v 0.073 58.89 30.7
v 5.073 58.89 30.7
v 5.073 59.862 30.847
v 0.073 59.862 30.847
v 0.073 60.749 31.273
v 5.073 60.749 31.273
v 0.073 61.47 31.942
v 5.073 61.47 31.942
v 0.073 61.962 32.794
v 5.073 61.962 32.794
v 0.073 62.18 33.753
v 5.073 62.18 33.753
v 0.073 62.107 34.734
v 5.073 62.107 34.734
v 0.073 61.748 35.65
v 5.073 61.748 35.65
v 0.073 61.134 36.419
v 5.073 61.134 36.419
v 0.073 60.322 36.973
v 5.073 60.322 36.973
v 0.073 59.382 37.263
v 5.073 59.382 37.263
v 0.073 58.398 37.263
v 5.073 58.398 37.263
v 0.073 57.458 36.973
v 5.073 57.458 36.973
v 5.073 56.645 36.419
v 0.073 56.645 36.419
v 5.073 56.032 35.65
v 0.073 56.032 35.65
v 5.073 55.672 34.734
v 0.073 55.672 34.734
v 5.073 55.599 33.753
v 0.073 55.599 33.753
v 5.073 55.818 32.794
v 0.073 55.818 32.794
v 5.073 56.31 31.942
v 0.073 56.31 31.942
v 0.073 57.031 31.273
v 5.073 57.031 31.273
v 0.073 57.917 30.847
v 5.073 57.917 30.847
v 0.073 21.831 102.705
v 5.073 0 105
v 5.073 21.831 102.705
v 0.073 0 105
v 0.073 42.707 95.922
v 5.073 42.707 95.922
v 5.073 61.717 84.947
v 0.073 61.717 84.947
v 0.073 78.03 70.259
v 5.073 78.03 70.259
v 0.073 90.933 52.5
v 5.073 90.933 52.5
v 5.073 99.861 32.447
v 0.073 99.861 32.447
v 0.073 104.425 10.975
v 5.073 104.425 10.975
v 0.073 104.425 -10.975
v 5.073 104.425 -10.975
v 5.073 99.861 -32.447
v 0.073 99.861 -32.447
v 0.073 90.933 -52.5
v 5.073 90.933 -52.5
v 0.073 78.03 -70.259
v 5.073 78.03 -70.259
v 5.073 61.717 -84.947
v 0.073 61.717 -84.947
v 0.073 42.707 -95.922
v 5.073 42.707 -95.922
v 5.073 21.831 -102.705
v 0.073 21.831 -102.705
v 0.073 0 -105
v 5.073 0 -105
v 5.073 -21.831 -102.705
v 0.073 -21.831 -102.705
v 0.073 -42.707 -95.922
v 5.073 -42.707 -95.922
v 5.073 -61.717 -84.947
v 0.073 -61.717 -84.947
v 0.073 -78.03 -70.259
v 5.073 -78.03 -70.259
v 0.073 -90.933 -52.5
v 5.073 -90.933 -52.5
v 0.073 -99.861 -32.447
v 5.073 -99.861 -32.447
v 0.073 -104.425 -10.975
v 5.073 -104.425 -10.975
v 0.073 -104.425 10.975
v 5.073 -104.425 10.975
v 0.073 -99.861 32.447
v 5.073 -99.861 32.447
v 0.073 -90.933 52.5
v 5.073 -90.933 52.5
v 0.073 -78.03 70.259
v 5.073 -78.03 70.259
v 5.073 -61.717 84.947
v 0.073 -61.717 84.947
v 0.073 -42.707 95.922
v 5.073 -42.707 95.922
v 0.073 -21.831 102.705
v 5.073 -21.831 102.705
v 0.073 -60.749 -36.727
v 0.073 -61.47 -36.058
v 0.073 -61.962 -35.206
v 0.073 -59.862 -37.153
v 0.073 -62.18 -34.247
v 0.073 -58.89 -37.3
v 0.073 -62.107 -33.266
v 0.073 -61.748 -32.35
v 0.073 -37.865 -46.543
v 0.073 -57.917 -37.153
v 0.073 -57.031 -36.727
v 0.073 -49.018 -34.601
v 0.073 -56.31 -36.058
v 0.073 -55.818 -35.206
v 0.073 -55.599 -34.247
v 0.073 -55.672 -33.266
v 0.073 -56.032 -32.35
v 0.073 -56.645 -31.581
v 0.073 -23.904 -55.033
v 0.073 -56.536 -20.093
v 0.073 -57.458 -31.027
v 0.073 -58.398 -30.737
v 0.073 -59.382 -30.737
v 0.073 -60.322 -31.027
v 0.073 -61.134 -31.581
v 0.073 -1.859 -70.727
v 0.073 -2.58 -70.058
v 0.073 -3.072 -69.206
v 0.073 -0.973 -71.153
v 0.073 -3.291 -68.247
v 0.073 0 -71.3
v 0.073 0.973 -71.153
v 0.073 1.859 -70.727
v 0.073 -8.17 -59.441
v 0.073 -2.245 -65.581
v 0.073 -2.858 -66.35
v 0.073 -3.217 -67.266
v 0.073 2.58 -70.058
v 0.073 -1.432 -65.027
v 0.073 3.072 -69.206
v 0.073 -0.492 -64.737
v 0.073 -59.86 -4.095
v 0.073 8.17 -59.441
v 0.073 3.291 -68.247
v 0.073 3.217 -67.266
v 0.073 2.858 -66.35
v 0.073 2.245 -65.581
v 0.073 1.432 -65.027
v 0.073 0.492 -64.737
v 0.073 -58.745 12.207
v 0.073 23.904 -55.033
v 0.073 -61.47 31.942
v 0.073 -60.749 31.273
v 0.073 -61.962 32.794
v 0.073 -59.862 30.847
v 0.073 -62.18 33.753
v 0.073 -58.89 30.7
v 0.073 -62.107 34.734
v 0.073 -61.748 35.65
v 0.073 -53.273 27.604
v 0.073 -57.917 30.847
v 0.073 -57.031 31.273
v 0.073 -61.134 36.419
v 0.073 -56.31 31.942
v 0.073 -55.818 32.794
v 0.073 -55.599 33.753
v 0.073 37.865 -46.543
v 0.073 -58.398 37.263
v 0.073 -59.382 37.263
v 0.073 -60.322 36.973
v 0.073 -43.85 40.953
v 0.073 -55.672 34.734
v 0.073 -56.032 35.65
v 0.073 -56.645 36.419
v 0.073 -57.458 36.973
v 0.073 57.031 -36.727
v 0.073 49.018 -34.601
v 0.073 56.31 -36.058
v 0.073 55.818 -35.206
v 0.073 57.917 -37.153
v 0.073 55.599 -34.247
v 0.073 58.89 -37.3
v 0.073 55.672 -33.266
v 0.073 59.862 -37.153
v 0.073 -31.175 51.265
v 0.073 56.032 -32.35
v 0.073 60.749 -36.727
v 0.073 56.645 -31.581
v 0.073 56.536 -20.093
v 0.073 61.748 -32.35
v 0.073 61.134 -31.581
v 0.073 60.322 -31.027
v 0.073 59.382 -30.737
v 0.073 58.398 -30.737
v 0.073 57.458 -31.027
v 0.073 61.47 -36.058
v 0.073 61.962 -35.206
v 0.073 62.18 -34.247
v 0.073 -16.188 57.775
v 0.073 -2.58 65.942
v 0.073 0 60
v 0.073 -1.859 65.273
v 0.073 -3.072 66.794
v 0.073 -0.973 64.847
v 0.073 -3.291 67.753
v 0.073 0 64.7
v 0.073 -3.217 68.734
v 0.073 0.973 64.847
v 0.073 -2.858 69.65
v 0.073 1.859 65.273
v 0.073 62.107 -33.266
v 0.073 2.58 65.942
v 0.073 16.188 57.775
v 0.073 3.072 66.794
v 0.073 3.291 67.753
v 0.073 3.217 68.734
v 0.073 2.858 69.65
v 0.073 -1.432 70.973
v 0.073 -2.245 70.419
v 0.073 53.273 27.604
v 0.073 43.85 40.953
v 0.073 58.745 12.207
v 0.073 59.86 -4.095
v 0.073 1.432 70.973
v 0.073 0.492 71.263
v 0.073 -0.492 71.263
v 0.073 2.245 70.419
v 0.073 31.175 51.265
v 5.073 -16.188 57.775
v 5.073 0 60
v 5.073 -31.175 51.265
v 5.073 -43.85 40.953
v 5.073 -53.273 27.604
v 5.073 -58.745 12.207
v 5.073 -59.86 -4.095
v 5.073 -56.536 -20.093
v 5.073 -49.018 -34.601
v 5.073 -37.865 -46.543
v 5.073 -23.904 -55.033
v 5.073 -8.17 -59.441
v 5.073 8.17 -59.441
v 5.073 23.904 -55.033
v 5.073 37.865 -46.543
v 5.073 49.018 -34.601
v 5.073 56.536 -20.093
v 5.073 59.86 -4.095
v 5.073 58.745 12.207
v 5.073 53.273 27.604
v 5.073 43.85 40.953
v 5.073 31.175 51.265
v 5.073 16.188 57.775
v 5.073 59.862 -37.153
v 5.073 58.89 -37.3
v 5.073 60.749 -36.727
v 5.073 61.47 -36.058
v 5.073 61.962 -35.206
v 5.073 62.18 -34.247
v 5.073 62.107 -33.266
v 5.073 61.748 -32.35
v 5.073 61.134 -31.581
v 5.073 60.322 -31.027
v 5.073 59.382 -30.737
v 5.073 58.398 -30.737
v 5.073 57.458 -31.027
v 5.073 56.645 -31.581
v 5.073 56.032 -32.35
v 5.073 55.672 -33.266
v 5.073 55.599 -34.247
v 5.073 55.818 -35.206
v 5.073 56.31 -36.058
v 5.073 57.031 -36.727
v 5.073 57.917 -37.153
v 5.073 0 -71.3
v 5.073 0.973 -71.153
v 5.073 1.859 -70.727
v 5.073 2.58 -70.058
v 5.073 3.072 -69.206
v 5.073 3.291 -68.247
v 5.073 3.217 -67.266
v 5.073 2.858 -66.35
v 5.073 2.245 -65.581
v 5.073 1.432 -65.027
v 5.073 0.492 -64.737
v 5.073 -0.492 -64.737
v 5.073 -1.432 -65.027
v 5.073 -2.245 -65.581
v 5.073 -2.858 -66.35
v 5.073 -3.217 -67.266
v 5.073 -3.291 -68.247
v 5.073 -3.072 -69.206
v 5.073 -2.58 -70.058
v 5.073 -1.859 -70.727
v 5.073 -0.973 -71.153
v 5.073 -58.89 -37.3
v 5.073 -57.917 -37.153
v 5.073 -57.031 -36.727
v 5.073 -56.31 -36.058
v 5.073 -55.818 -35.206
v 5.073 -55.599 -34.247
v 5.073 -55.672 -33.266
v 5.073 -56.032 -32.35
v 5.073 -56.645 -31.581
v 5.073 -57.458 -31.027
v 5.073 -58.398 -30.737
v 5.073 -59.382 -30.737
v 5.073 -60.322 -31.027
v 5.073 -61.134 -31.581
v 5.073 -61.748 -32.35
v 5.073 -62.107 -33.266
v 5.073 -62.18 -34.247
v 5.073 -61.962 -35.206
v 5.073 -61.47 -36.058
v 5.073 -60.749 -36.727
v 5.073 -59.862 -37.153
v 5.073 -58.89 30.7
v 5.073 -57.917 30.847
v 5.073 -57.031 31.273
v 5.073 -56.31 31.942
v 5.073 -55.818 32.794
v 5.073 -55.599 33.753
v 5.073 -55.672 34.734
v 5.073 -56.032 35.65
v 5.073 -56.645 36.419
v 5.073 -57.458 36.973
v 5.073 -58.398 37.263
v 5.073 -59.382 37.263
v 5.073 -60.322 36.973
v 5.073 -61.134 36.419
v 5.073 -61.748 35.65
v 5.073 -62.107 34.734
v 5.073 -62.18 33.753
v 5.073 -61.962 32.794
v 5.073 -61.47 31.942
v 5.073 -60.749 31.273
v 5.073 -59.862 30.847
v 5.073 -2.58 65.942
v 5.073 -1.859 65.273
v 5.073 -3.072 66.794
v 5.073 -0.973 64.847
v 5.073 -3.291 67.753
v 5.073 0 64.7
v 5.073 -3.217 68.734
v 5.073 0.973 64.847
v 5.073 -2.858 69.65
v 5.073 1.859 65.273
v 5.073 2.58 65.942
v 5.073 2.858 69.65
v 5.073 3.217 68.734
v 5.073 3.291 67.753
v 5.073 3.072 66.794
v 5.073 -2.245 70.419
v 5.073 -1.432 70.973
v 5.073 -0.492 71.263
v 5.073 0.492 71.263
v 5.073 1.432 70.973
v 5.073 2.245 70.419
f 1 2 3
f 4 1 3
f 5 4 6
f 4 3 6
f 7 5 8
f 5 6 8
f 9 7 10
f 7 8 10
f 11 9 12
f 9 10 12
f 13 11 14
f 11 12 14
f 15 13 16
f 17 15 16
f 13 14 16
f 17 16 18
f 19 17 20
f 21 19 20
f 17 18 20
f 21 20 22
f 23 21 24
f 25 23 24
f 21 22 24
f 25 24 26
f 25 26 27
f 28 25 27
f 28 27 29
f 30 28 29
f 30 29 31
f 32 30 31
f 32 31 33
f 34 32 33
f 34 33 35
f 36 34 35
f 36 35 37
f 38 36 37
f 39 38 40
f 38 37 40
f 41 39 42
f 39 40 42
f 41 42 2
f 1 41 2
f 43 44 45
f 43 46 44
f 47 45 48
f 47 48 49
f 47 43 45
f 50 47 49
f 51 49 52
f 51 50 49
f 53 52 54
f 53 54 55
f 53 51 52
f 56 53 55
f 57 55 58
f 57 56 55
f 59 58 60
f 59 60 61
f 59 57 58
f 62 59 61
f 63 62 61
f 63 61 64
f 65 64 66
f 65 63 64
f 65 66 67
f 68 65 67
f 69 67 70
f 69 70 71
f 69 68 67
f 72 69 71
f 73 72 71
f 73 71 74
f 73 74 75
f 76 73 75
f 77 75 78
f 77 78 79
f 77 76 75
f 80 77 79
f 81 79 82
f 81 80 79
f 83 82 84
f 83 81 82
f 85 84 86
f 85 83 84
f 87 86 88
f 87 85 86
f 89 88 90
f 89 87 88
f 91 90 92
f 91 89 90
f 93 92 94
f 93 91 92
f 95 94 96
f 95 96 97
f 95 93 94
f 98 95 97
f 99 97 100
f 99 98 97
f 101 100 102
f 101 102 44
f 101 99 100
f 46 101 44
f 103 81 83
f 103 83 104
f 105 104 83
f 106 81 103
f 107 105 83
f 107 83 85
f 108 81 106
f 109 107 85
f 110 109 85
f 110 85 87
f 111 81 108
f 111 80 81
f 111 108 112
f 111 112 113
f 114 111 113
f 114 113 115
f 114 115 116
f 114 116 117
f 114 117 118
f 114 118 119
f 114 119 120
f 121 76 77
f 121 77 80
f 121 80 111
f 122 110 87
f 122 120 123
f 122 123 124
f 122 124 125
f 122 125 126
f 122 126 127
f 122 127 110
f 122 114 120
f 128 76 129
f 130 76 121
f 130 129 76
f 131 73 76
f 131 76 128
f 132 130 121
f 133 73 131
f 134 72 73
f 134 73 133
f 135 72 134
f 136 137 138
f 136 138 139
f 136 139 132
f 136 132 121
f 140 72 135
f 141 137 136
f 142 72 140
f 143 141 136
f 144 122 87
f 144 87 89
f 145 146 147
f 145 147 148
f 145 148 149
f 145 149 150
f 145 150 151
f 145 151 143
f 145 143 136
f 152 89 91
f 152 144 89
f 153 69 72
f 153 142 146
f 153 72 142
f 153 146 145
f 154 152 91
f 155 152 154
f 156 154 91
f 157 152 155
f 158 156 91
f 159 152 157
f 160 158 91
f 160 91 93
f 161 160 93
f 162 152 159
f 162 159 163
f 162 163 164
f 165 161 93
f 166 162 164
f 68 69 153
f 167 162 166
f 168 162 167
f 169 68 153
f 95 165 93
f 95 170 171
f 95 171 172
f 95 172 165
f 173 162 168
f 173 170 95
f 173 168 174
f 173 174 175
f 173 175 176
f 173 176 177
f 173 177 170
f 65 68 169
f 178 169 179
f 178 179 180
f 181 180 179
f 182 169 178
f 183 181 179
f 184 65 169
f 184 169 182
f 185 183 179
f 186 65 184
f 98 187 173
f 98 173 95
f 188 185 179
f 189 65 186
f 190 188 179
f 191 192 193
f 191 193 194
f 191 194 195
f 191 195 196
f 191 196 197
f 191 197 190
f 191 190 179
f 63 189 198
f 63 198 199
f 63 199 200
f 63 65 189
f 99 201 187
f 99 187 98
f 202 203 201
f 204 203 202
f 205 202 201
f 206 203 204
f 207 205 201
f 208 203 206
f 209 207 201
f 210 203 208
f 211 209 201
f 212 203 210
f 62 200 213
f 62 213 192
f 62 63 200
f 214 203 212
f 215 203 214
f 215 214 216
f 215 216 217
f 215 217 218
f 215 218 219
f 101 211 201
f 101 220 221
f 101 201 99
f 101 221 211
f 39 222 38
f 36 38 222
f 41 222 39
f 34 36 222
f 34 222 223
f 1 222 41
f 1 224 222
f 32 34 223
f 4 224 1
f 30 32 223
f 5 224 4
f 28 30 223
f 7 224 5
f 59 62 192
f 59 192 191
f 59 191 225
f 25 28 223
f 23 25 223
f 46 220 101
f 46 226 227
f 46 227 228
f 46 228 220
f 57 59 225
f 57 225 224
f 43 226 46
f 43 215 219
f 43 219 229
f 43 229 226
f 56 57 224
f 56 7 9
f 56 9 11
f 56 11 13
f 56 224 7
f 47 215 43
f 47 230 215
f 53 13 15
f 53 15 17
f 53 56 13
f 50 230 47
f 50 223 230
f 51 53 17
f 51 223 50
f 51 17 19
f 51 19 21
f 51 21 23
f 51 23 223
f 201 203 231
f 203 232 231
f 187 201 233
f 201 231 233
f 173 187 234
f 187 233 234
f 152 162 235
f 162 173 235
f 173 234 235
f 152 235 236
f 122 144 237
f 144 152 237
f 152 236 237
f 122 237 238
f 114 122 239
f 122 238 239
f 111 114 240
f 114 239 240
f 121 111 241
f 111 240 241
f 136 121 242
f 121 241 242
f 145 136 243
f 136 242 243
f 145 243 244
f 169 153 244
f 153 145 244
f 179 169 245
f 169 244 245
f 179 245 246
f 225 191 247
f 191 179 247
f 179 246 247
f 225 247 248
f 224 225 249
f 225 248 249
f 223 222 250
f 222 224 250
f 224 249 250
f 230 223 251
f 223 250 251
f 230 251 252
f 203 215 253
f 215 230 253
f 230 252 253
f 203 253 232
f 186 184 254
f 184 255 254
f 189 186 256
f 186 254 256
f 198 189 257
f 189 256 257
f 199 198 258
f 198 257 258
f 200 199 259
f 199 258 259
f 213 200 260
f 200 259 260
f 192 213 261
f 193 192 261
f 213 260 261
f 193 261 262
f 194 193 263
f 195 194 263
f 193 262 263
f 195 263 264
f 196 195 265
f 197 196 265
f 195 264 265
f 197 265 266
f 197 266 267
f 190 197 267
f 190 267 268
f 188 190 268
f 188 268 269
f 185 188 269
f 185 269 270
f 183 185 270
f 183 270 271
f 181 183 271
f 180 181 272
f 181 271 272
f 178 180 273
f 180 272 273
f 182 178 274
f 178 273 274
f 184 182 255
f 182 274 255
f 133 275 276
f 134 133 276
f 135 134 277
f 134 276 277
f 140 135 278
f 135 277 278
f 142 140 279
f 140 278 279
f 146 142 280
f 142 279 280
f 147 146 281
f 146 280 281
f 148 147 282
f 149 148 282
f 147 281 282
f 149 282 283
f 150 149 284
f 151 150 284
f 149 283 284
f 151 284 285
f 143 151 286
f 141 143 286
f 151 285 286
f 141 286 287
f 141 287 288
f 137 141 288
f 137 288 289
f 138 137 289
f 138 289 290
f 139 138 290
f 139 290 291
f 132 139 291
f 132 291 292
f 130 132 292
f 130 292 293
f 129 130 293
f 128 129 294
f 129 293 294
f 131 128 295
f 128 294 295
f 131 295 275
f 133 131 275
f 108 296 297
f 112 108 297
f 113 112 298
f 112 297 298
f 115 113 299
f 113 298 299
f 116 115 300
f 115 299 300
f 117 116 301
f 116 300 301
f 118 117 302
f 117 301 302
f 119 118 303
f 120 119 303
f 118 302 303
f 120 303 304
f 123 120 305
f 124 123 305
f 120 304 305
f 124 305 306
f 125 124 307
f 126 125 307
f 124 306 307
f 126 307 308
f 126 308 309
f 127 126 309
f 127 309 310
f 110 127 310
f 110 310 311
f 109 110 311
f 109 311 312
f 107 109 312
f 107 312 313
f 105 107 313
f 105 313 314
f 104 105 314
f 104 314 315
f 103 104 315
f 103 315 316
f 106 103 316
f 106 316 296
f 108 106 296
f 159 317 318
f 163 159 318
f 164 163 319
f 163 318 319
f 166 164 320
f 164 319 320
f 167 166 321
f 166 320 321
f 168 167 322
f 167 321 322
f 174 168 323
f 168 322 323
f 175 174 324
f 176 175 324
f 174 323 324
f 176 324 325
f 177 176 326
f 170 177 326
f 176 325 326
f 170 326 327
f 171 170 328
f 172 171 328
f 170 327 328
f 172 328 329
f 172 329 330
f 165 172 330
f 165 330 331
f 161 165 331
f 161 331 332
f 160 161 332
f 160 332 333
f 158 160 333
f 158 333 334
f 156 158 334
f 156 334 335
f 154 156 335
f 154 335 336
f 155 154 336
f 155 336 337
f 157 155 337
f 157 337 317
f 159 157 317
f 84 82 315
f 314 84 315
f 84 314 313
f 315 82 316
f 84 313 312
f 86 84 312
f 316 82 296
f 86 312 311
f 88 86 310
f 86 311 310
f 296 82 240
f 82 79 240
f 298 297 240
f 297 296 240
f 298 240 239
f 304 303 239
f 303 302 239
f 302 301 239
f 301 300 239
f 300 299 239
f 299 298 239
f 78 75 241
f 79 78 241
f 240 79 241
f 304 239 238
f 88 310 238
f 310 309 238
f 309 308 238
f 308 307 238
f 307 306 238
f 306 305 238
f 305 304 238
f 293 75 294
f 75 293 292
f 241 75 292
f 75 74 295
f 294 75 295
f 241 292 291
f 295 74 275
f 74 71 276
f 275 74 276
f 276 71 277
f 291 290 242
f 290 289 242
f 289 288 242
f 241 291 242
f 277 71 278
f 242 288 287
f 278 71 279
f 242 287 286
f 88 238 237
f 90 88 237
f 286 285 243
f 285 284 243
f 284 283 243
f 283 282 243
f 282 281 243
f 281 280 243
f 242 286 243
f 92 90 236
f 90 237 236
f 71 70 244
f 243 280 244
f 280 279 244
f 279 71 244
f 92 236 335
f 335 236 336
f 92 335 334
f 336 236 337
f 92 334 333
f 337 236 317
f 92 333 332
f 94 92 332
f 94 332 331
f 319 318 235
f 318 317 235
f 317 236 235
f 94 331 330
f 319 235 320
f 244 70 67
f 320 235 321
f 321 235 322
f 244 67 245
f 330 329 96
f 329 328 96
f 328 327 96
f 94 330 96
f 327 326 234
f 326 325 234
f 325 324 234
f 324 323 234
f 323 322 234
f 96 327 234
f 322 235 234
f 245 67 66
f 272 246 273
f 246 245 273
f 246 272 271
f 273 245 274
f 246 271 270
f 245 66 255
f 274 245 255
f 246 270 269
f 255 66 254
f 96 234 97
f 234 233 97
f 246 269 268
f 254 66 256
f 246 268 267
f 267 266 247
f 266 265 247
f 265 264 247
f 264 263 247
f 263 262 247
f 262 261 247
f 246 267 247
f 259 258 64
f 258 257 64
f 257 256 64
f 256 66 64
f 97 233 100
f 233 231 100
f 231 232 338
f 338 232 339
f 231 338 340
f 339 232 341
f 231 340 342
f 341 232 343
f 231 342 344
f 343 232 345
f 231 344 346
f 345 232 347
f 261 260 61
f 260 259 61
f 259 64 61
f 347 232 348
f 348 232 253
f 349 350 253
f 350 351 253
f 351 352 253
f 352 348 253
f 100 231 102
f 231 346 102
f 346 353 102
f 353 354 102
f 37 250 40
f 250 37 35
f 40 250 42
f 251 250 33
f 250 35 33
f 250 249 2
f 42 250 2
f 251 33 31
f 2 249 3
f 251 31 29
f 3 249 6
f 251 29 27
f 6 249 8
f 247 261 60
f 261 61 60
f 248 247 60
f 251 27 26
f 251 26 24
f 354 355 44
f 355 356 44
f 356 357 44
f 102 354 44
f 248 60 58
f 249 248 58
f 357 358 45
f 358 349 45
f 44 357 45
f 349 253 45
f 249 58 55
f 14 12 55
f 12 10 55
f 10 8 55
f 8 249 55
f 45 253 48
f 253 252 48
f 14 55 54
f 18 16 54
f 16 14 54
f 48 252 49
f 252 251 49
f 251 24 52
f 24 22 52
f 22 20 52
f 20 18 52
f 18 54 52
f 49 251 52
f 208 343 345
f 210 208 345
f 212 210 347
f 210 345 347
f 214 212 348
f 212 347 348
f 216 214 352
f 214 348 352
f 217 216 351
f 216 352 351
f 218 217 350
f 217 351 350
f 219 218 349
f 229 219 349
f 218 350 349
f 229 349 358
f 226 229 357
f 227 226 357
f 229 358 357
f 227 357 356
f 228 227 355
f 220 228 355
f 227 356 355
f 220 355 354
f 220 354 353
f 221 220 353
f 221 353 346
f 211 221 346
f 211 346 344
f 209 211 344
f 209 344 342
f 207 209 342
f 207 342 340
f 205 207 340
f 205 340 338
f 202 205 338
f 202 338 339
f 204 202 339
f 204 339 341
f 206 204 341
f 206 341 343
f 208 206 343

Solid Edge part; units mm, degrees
sketch "Sketch1" plane through (0, 0, 0) normal (0, -1, 0) x (1, 0, 0)
  line L0 (0.073, 60) -> (5.073, 60)
  line L1 (5.073, 60) -> (5.073, 105)
  line L2 (5.073, 105) -> (0.073, 105)
  line L3 (0.073, 105) -> (0.073, 60)
  dimension "D1" = 45
  dimension "D2" = 5
  dimension "D3" = 60
revolve "RevolvedProtrusion1" add sketch "Sketch1" angle 360 about axis through (23.5691, 0, 0) along (-1, 0, 0)
hole "Hole1" at (5.073, 0, 68) direction (-1, 0, 0) diameter 6.6 end up to next
hole "Hole2" at (5.073, -58.8897, 34) direction (-1, 0, 0) diameter 6.6 end up to next
hole "Hole3" at (5.073, -58.8897, -34) direction (-1, 0, 0) diameter 6.6 end up to next
hole "Hole4" at (5.073, 0, -68) direction (-1, 0, 0) diameter 6.6 end up to next
hole "Hole5" at (5.073, 58.8897, -34) direction (-1, 0, 0) diameter 6.6 end up to next
hole "Hole6" at (5.073, 58.8897, 34) direction (-1, 0, 0) diameter 6.6 end up to next
properties material "Steel"
